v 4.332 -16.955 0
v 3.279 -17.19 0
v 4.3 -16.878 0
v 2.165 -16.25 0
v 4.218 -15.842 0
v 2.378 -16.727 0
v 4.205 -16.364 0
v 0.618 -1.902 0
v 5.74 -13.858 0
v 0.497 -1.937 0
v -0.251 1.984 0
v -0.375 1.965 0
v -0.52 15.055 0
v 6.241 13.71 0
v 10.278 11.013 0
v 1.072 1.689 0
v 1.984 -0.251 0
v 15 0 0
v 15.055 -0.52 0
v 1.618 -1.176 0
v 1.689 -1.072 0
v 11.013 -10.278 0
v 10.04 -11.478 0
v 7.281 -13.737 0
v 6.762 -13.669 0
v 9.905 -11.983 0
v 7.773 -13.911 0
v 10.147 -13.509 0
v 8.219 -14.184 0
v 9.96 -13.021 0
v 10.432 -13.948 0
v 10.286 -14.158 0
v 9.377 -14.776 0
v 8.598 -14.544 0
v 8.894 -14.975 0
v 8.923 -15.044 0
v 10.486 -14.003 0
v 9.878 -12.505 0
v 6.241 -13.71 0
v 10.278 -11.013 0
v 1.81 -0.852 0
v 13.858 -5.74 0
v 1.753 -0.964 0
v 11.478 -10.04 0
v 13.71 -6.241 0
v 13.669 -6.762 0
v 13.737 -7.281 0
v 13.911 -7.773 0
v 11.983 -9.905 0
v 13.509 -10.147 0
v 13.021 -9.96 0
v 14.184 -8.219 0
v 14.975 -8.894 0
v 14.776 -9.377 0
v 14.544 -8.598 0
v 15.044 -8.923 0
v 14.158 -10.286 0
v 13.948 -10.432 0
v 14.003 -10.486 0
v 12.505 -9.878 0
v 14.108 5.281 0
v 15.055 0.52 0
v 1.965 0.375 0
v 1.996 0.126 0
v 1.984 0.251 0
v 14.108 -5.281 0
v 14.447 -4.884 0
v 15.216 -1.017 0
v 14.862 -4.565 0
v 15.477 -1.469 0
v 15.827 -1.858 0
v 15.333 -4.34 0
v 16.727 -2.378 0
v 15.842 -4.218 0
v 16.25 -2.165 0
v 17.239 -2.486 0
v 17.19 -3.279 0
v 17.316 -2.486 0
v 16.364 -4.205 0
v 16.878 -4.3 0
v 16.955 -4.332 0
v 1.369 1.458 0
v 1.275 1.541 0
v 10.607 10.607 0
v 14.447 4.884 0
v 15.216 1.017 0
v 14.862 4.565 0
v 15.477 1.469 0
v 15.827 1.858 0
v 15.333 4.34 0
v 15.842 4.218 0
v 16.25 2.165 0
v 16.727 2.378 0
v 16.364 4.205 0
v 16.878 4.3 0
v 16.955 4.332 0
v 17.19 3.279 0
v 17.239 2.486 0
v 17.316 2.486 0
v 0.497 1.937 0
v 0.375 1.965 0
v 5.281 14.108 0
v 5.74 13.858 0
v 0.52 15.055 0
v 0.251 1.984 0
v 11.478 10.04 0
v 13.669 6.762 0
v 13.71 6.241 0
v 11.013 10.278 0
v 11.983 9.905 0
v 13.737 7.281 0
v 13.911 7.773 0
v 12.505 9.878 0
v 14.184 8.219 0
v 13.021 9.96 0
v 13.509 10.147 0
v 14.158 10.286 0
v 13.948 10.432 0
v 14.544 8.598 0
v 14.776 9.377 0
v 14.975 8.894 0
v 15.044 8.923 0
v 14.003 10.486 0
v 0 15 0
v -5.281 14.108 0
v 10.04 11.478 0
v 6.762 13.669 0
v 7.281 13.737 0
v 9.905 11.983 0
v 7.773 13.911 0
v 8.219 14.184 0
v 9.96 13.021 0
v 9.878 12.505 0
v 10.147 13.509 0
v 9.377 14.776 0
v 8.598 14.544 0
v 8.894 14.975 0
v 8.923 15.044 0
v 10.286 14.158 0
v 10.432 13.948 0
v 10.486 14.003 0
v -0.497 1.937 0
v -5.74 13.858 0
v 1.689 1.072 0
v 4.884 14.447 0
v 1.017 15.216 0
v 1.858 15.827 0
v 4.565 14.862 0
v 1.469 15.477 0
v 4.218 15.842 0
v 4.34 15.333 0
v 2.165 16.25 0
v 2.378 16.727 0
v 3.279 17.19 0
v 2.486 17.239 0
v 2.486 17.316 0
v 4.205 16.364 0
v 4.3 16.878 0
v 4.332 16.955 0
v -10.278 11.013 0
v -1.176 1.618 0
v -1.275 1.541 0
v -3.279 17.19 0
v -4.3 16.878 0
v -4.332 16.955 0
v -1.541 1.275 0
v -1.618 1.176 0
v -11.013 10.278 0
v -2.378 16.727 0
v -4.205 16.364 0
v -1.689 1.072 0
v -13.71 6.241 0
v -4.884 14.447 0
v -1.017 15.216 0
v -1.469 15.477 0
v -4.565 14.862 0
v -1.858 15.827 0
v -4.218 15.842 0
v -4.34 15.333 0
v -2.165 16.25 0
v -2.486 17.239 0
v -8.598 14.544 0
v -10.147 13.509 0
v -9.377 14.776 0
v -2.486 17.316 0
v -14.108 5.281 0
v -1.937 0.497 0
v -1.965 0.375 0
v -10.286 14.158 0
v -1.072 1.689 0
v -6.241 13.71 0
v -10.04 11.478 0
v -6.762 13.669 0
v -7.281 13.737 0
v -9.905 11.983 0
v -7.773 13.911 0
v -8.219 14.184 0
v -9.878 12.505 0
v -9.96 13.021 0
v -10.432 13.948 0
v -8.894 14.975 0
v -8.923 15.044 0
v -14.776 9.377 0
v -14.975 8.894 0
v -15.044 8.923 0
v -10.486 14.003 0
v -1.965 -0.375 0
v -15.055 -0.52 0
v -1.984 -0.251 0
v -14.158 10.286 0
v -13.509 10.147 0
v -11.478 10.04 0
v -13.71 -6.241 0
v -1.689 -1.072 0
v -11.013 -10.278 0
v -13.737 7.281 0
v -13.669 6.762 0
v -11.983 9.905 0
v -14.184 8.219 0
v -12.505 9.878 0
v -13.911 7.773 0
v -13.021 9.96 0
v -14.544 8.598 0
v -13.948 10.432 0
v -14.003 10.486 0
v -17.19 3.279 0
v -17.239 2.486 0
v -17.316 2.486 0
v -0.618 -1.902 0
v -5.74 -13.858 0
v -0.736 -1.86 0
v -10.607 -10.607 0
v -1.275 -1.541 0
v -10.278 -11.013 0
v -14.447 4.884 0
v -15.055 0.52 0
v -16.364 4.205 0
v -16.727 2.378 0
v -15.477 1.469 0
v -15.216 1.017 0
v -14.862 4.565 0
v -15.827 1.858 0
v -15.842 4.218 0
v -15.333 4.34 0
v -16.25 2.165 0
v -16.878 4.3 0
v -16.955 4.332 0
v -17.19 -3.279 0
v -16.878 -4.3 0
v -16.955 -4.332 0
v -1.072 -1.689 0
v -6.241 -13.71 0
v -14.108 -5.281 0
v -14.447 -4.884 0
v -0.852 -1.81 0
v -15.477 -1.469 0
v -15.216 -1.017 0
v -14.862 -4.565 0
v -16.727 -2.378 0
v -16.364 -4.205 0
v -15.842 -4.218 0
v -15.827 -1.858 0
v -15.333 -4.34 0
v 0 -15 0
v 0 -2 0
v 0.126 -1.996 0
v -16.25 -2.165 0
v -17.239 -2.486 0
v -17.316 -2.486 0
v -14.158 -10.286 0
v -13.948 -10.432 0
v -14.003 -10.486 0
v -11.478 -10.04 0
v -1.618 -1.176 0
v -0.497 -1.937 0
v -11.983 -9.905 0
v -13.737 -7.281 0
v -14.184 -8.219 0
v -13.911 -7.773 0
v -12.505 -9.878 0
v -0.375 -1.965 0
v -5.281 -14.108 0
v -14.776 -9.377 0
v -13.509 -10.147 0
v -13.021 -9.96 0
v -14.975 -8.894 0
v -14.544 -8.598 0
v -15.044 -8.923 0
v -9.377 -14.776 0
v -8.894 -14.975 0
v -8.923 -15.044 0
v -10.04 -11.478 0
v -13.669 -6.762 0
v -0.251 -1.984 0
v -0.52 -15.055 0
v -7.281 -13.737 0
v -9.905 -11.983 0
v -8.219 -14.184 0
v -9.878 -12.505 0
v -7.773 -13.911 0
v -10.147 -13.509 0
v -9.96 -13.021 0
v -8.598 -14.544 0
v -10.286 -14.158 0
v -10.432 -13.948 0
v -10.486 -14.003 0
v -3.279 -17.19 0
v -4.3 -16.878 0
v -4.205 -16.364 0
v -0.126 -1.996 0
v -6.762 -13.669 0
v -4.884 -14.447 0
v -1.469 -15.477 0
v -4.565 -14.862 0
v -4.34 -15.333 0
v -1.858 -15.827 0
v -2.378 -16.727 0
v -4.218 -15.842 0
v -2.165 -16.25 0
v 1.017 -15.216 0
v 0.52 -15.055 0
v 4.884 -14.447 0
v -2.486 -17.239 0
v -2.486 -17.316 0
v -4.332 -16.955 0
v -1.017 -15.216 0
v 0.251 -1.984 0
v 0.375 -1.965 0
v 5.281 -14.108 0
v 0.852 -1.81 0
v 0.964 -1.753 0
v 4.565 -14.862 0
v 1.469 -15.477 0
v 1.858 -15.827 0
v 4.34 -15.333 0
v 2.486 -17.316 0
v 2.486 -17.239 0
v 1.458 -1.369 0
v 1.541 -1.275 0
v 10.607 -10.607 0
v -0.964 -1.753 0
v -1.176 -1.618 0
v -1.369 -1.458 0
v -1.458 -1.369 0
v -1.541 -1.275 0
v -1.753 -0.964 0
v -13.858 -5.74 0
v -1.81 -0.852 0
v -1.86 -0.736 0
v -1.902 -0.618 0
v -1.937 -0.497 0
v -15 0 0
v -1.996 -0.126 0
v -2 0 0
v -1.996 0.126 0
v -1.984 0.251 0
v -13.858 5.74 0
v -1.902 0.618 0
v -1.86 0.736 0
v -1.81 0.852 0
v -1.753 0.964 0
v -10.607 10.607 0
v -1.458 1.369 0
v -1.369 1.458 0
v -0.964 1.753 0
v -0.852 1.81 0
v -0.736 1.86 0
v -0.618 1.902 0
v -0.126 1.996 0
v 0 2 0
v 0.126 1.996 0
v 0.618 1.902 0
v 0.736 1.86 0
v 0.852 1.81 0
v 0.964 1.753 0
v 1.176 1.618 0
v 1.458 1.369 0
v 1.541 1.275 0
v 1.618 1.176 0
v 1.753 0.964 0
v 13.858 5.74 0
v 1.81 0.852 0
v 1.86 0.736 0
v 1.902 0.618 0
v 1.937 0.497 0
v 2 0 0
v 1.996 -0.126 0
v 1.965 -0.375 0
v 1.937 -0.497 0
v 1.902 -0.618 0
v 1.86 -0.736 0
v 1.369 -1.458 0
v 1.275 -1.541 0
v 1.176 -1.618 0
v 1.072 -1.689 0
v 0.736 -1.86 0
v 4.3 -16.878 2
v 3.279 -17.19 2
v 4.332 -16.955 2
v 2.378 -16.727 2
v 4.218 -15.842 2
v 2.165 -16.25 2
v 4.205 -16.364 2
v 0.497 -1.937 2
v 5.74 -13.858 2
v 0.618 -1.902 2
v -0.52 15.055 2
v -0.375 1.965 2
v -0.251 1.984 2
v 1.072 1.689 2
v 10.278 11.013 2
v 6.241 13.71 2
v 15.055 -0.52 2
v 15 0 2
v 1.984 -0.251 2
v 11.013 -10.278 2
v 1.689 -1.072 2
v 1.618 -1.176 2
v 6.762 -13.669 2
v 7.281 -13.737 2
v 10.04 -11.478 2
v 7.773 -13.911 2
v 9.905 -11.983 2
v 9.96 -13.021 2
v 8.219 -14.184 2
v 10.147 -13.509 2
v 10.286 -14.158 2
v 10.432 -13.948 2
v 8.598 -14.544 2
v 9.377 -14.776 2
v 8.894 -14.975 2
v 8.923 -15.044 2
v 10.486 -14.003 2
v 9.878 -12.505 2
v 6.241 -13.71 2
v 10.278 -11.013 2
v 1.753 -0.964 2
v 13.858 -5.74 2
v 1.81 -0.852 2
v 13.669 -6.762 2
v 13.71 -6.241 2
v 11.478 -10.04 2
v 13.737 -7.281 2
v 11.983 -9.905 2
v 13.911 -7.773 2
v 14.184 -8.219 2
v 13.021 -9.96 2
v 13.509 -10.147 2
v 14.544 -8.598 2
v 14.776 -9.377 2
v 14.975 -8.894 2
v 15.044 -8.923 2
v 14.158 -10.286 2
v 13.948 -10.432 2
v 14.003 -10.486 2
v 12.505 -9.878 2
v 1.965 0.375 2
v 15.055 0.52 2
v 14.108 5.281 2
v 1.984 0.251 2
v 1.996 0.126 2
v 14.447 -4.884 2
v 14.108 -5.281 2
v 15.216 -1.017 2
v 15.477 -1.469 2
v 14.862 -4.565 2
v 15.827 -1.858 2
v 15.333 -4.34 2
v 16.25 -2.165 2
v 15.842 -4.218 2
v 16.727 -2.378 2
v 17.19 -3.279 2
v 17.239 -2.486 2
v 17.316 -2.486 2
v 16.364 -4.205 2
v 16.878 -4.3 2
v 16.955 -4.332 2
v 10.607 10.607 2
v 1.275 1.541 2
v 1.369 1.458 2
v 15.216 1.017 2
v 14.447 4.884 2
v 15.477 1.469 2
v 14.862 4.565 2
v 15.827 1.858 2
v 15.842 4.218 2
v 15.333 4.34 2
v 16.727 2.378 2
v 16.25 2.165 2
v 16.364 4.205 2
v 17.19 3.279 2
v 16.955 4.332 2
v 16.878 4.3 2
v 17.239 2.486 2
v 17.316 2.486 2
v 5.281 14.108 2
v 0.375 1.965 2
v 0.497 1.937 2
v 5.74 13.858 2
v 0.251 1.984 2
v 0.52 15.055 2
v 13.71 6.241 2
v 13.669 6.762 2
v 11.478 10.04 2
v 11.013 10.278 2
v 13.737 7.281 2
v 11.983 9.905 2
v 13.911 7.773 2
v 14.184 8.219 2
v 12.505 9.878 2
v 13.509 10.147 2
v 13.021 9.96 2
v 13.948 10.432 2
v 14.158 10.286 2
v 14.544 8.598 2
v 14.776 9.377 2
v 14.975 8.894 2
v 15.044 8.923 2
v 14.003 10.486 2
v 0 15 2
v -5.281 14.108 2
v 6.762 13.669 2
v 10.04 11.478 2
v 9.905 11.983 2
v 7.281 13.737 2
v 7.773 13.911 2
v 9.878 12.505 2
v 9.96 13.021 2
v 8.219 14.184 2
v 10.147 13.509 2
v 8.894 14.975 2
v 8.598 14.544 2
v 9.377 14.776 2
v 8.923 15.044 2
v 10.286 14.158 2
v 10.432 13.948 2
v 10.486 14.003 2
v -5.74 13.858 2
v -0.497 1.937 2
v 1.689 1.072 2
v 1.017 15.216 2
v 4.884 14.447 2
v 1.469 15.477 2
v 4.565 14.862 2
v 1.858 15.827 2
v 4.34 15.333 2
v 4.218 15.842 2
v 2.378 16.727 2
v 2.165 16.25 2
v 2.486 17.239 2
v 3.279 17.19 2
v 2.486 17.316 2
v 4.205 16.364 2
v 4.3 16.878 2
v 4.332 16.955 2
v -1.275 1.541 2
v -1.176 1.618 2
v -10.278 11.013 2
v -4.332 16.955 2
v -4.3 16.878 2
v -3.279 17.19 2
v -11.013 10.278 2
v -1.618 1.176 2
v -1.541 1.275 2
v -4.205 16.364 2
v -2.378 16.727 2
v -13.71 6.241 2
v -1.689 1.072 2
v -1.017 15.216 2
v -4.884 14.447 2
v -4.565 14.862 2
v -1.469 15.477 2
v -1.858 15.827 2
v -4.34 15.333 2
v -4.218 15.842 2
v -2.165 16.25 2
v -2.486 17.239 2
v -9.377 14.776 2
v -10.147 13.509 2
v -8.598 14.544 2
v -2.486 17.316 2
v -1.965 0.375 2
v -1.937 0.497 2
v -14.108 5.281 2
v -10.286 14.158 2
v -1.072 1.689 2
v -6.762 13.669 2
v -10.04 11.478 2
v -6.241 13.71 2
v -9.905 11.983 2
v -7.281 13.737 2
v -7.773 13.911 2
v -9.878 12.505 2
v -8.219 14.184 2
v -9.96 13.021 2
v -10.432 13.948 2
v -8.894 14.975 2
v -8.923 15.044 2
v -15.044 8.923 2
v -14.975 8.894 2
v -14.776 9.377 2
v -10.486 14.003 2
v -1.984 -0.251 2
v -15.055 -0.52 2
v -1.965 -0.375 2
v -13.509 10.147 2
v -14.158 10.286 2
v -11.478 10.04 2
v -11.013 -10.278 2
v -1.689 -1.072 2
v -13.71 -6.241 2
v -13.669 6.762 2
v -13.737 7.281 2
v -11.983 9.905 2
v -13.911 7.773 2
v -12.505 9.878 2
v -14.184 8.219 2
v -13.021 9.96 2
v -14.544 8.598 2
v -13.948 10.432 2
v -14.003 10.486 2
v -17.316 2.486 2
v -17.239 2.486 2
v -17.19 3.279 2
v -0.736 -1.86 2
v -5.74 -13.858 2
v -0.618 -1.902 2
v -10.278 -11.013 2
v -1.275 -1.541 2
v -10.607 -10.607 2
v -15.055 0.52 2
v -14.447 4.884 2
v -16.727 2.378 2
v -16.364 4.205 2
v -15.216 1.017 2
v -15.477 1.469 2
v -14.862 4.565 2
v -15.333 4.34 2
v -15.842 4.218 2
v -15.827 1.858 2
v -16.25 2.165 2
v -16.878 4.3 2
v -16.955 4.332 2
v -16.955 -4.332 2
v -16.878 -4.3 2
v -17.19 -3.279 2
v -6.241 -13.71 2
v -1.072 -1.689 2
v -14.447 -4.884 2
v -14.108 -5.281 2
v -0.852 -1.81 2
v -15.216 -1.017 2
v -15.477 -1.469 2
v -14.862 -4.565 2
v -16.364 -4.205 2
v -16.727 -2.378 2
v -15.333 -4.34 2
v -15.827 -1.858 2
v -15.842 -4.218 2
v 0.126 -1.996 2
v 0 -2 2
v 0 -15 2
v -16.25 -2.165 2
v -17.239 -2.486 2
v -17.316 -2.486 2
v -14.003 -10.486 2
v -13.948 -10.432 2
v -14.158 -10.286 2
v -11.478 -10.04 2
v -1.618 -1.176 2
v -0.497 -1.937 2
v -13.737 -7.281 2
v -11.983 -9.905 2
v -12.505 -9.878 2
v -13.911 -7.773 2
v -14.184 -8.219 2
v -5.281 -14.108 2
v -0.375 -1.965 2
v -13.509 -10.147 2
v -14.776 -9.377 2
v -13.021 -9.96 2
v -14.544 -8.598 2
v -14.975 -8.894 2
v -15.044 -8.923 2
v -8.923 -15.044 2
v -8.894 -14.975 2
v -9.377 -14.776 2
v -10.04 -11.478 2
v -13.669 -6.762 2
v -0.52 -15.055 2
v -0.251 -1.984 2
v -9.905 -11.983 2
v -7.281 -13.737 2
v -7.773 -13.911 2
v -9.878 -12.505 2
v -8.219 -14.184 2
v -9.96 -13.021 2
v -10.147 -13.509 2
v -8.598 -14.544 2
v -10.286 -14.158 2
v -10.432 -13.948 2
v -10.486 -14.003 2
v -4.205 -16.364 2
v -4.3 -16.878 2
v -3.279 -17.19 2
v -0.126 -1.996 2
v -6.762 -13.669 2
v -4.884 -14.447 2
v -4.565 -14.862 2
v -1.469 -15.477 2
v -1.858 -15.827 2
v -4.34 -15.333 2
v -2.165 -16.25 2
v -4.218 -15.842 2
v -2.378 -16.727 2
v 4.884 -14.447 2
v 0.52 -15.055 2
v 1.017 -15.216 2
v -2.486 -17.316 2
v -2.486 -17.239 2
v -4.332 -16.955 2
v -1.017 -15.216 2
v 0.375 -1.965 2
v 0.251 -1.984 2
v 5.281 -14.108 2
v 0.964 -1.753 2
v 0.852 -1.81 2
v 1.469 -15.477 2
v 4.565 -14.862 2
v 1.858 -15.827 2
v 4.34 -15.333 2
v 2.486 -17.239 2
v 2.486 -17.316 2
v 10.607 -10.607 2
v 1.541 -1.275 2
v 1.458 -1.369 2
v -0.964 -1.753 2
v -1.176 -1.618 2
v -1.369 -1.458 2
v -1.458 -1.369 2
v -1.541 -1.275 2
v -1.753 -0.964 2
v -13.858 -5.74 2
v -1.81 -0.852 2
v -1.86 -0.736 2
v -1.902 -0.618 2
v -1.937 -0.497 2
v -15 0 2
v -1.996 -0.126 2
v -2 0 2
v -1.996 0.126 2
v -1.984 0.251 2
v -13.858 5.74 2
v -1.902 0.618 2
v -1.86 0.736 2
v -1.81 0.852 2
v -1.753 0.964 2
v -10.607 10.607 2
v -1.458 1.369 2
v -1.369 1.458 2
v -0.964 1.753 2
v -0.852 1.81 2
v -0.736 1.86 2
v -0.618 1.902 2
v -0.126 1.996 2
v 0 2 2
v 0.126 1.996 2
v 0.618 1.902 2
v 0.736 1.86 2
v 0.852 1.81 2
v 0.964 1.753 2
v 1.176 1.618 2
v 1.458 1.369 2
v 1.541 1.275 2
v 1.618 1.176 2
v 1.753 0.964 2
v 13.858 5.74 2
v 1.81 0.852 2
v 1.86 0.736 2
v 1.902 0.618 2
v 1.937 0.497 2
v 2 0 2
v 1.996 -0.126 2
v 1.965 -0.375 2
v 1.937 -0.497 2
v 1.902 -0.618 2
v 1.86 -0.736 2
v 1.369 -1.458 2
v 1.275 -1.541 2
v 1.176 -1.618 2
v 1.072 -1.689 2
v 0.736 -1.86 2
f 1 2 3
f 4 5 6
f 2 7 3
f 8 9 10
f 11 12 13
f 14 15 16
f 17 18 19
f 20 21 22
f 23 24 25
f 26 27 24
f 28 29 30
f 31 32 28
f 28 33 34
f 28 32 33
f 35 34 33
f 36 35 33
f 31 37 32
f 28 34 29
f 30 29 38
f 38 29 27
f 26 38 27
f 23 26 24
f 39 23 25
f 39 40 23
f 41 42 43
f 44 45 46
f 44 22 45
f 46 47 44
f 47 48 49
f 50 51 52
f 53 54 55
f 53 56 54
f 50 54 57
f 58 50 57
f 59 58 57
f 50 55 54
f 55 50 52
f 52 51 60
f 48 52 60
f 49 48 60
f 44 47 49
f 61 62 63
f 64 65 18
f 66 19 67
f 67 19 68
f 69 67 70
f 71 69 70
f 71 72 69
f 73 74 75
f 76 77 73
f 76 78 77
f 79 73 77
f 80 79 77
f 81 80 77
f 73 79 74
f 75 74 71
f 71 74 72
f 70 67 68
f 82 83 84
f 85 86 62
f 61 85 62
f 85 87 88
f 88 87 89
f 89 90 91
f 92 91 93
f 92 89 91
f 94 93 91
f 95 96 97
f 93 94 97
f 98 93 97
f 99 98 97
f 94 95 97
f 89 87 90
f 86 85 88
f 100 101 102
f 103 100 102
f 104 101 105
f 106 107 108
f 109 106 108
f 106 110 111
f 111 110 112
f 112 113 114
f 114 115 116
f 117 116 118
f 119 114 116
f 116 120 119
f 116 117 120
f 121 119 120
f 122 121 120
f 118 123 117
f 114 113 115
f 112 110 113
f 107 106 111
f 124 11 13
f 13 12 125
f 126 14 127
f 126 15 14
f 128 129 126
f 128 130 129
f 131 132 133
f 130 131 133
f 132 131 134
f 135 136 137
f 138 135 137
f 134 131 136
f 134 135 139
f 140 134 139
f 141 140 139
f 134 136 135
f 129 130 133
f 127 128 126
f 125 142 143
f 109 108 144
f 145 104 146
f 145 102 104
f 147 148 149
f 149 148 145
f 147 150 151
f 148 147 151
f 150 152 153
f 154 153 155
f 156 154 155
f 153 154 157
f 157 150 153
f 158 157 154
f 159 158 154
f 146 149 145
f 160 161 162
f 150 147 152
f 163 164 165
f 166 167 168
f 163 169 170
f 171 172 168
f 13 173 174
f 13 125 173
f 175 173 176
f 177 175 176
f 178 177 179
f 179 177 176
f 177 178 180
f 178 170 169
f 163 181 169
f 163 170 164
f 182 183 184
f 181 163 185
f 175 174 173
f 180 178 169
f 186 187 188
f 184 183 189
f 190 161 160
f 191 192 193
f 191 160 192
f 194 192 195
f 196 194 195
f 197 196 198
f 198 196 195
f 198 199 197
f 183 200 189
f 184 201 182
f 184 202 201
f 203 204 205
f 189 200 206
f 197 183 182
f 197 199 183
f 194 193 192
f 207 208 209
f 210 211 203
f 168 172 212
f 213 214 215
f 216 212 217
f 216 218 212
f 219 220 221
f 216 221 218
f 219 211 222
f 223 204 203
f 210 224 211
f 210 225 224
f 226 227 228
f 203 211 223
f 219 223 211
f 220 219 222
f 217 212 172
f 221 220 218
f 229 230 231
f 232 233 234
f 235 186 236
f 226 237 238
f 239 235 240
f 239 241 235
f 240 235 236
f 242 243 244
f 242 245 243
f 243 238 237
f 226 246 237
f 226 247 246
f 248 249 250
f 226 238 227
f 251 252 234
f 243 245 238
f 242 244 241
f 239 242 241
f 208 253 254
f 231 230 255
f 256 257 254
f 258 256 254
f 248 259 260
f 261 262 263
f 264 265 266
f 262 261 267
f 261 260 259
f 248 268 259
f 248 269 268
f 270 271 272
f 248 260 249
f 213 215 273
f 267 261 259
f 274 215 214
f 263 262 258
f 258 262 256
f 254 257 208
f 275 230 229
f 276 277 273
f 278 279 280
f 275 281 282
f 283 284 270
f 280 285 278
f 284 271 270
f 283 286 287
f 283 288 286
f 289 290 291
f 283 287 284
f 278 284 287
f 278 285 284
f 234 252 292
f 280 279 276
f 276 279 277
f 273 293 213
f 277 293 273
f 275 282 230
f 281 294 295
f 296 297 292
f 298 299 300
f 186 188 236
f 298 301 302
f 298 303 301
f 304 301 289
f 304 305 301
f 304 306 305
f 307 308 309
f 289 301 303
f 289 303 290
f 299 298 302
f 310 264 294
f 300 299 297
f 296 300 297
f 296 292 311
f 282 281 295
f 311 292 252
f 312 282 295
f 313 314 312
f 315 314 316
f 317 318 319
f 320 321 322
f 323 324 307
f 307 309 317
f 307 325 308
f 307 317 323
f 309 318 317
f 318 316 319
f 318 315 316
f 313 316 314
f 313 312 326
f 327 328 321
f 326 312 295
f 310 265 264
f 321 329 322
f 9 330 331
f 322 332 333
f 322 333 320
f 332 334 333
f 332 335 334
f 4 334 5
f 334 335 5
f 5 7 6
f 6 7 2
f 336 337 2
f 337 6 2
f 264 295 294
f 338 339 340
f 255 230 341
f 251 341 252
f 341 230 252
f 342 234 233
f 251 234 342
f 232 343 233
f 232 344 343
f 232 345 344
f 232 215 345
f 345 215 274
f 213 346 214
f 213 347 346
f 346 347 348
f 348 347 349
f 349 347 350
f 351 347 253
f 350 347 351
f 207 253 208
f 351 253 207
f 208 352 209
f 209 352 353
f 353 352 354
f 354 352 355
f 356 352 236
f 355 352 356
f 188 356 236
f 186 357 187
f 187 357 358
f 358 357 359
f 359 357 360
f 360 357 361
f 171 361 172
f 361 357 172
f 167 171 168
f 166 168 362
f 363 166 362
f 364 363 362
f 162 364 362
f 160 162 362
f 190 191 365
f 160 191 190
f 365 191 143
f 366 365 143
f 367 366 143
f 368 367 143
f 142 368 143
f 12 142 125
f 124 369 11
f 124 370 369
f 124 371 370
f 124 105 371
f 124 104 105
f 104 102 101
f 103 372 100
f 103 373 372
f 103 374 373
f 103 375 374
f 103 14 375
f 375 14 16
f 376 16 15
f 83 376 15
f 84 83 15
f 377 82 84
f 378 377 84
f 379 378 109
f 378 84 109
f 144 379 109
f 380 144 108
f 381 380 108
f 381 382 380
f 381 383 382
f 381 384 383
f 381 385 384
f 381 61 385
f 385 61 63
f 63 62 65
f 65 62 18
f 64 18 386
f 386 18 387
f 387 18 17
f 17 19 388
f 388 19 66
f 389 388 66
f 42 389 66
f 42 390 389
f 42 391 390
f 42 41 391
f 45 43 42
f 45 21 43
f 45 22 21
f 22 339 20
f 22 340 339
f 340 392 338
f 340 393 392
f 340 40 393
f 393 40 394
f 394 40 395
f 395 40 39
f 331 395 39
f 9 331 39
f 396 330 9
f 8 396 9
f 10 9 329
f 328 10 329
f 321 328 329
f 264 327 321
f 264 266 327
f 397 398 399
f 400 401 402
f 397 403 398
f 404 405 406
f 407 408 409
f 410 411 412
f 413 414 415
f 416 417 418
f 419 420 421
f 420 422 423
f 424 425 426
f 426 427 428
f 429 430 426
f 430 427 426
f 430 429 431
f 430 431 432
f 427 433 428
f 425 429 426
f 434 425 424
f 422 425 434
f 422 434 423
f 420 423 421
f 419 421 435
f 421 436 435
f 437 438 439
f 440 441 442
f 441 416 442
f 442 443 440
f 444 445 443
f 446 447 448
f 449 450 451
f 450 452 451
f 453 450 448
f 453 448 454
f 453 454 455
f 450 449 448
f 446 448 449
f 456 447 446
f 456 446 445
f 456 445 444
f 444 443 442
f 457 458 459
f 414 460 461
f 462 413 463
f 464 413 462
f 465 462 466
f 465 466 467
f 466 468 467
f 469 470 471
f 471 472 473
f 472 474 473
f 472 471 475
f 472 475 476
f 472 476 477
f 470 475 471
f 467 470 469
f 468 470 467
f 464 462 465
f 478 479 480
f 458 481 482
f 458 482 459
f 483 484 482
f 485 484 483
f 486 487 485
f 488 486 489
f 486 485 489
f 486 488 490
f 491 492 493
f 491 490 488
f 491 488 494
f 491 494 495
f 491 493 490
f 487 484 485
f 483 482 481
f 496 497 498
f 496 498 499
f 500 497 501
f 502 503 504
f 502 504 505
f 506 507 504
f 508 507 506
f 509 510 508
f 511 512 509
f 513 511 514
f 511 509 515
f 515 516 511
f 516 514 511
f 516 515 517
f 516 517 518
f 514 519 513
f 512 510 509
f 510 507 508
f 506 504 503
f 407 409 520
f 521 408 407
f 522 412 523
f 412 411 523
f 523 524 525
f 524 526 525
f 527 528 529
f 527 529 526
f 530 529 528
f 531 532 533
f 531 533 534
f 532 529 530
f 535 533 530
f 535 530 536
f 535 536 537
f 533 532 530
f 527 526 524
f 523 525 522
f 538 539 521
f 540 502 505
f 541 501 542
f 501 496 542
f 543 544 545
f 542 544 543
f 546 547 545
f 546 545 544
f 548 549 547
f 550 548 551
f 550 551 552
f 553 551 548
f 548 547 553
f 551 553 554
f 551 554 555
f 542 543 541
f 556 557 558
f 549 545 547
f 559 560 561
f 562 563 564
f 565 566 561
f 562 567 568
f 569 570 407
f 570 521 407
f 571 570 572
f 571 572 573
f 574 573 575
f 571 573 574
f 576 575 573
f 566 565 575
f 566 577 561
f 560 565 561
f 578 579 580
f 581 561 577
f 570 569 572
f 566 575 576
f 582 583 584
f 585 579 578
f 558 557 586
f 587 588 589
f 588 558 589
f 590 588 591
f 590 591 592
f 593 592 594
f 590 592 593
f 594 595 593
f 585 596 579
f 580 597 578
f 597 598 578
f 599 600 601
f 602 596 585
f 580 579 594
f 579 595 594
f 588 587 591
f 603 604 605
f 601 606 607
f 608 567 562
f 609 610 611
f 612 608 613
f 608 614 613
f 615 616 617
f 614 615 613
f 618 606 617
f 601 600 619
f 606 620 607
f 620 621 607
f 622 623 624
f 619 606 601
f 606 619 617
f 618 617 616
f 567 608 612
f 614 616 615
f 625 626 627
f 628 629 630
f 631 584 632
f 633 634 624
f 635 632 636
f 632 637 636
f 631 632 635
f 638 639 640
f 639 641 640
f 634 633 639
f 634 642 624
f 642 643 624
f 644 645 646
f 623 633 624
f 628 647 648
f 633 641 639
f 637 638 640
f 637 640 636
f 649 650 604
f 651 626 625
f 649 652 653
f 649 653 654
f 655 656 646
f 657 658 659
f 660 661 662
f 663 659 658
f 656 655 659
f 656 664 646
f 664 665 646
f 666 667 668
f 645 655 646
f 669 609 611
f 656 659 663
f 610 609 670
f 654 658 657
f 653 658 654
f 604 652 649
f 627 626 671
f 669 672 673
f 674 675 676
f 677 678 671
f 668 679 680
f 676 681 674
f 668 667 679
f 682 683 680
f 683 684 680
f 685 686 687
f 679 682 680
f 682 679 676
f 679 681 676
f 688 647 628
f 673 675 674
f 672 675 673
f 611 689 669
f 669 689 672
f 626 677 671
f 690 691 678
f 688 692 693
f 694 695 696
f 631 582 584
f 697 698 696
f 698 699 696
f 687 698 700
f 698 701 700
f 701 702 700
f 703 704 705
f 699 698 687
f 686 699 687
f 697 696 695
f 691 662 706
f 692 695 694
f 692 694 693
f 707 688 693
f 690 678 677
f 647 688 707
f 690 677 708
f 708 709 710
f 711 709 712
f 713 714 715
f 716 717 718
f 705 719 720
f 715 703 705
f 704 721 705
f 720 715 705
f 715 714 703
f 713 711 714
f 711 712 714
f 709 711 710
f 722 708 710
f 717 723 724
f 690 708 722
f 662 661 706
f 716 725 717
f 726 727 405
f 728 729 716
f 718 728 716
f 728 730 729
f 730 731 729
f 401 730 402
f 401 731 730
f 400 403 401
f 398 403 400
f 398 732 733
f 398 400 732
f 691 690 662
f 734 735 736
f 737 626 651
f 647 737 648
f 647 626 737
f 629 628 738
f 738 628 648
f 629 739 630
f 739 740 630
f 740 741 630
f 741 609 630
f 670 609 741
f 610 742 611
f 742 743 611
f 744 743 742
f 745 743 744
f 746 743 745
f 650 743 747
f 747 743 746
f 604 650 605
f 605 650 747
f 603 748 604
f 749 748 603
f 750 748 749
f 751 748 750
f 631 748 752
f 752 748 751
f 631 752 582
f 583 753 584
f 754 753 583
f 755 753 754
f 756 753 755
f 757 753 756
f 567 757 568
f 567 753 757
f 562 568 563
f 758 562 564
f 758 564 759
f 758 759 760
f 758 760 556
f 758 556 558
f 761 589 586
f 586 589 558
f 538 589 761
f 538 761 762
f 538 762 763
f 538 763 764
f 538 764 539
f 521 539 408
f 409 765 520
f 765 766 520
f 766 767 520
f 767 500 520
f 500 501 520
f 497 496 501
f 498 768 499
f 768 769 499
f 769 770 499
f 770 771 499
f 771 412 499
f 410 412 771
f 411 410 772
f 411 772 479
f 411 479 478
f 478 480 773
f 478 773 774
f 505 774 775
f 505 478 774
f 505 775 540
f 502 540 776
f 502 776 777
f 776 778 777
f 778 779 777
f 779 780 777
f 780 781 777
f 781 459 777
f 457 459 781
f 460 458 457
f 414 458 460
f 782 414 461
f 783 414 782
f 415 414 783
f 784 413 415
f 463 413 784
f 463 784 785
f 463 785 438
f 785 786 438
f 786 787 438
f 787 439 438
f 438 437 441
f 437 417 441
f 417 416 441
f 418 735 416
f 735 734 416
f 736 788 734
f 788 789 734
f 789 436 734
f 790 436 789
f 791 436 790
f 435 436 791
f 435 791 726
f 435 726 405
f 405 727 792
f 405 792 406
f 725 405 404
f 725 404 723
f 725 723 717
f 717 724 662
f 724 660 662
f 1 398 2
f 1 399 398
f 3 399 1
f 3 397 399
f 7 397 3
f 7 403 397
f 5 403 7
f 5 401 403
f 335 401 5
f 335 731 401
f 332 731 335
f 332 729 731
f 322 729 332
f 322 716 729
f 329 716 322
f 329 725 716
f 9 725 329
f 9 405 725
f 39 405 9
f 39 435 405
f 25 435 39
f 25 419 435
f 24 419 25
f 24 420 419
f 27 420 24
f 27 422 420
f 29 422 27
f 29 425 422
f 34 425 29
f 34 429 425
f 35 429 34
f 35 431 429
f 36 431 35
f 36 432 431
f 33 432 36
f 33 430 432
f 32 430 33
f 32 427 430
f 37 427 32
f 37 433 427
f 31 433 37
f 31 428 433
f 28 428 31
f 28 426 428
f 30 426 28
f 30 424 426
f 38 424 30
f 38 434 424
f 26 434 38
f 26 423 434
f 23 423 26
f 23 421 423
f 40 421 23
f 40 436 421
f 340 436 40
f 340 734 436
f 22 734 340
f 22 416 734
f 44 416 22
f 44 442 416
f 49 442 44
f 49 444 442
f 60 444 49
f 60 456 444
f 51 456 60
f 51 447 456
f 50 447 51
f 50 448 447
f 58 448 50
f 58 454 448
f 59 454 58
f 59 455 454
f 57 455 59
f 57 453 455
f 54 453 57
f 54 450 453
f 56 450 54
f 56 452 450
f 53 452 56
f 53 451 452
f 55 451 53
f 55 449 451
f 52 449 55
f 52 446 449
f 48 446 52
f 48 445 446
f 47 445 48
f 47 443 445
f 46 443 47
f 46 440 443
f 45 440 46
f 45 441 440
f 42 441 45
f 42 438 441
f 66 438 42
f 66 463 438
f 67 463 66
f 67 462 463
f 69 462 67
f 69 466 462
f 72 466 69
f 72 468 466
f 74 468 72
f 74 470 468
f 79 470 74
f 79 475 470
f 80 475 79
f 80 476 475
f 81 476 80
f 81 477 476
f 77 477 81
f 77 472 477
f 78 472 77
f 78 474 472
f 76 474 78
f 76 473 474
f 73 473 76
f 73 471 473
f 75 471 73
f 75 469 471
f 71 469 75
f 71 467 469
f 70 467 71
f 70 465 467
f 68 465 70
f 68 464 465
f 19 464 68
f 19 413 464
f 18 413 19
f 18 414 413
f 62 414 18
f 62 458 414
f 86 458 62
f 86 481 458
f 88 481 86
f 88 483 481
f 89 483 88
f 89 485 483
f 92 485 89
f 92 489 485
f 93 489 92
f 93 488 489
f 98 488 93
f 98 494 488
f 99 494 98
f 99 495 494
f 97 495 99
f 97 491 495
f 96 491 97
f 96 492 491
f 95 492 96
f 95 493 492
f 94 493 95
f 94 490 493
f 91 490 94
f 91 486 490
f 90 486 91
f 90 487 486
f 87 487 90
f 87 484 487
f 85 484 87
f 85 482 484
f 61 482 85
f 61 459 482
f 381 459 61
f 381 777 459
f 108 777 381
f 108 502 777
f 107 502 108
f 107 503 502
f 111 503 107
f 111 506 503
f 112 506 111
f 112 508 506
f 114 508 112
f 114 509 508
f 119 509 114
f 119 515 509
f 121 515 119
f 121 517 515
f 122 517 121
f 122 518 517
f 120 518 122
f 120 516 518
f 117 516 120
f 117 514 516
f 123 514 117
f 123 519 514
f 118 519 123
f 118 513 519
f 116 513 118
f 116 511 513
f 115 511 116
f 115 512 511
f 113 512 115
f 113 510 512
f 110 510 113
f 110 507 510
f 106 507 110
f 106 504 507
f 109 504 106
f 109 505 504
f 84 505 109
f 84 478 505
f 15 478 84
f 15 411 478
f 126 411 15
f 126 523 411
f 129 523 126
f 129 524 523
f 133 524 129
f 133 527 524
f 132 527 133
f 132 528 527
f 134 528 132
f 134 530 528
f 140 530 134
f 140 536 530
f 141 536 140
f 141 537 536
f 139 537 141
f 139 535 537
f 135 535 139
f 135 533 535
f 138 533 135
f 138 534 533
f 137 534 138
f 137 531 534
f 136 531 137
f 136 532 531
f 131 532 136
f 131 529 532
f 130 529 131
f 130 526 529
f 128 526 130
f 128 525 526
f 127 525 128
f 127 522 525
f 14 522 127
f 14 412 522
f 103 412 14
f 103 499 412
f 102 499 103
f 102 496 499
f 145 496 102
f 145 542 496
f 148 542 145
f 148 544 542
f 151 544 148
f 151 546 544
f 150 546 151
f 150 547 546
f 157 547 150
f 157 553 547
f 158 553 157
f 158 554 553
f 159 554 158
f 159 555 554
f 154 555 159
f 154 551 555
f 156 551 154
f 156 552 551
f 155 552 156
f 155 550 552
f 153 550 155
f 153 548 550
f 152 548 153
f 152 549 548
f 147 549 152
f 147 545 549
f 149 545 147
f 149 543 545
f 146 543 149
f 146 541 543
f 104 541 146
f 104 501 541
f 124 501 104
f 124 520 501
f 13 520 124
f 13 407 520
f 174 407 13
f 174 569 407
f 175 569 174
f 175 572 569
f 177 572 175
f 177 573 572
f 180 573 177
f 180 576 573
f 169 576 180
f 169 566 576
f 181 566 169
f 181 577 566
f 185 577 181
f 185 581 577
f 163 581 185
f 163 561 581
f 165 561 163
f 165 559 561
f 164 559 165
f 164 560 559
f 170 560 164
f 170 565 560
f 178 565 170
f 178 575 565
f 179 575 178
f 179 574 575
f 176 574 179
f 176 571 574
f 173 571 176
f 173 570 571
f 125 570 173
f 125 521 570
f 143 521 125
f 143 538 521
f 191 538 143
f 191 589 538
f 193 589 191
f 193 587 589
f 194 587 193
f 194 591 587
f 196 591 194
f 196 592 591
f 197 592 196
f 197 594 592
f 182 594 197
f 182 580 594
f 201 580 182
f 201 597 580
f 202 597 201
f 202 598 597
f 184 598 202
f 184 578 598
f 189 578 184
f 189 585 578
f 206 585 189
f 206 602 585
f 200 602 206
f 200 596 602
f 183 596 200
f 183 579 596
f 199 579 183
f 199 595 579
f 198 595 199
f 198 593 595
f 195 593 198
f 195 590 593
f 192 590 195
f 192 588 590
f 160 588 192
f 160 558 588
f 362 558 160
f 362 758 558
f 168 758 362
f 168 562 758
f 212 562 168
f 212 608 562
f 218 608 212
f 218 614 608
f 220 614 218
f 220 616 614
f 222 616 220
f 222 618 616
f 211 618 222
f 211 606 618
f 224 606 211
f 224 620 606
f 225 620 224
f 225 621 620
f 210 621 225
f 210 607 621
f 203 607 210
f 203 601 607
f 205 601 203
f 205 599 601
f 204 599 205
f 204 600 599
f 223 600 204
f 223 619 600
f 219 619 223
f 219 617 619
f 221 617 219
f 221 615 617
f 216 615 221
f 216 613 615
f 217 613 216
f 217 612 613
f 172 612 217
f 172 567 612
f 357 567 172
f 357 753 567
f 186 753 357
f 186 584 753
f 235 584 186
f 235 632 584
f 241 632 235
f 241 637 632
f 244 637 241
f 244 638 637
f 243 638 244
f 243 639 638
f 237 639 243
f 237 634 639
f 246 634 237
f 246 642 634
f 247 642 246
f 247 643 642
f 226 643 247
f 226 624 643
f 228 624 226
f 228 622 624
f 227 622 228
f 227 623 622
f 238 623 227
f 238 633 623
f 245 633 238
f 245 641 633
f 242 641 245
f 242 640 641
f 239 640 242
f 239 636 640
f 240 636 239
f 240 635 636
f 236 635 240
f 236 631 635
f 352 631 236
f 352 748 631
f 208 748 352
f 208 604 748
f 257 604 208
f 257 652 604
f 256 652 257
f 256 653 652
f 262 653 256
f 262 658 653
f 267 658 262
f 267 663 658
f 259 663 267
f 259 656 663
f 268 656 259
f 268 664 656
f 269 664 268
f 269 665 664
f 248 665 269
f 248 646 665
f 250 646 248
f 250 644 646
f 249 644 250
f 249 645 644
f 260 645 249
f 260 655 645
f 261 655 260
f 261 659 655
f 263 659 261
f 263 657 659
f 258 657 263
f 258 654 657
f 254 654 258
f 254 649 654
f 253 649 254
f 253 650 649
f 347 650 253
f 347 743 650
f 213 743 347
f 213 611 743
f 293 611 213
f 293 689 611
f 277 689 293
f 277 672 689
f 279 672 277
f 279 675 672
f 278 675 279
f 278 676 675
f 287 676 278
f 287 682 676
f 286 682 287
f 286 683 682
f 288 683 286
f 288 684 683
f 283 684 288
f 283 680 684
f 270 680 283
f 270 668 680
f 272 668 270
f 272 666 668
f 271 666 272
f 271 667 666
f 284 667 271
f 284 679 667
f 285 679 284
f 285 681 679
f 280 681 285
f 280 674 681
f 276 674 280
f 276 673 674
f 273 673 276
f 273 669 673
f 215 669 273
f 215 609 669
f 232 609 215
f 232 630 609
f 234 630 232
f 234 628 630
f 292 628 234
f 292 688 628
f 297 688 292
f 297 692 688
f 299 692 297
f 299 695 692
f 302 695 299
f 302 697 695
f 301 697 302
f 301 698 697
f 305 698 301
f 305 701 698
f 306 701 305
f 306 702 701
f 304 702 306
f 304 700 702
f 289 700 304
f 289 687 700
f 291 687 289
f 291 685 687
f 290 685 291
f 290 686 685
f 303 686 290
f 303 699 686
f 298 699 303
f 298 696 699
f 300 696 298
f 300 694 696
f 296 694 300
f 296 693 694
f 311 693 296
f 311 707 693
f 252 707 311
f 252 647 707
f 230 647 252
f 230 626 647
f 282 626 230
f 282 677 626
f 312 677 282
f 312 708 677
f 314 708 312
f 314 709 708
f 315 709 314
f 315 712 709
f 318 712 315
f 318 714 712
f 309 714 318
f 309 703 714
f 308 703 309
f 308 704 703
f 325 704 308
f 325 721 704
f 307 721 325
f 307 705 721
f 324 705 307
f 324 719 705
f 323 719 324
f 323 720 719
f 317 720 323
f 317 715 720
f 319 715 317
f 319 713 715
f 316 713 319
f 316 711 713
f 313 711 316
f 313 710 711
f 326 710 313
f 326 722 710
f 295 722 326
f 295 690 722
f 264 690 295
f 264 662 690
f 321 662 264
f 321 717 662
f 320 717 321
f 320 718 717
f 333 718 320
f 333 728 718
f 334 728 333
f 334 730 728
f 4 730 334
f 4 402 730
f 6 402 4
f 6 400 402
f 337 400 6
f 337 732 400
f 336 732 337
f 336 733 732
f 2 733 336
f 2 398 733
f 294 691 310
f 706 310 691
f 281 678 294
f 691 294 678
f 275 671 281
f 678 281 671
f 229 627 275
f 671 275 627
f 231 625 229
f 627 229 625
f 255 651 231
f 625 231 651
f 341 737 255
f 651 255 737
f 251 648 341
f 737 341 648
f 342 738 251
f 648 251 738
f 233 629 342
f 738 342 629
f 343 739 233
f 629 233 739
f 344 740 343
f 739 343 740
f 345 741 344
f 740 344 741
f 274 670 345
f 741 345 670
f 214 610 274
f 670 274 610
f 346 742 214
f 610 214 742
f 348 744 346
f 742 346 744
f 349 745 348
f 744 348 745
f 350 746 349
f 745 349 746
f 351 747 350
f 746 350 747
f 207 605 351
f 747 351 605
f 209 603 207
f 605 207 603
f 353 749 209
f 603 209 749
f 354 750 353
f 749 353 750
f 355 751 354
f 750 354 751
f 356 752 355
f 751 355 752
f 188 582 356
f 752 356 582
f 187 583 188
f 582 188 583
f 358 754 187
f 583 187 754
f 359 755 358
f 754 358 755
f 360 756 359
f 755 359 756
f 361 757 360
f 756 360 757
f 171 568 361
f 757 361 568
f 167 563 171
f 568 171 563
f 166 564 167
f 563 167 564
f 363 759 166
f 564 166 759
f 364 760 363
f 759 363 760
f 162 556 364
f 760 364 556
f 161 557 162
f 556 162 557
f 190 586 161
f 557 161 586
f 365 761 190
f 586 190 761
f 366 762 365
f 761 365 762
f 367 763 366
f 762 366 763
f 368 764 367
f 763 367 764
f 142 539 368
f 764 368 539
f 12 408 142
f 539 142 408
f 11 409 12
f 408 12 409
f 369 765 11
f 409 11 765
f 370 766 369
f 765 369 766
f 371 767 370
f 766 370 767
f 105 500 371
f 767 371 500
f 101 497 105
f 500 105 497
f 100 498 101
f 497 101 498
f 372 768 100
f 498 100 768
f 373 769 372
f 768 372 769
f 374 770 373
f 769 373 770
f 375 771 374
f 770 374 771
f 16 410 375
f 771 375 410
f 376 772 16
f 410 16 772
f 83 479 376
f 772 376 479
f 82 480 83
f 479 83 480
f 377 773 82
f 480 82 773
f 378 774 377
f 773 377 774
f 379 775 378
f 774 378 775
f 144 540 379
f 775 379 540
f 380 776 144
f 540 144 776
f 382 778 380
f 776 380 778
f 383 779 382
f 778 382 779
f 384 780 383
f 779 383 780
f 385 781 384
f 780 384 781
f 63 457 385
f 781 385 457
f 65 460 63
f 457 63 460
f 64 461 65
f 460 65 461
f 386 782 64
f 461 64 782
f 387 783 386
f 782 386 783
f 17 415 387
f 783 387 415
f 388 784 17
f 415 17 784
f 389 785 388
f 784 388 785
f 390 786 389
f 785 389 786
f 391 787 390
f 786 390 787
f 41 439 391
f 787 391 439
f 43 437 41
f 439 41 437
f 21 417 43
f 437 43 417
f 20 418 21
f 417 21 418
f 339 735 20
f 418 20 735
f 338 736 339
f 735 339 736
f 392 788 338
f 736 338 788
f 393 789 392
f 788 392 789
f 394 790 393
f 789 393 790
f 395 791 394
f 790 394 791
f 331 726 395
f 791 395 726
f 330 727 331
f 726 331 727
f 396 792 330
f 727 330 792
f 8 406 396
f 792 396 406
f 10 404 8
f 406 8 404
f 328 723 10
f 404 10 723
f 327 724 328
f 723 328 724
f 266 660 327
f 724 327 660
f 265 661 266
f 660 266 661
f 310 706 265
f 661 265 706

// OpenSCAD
outer_diameter = 35;
inner_diameter = 4;
ring_height = 2;
num_holes = 16;
hole_diameter = 5;
hole_radius = outer_diameter / 2 ;


module ring2D() {
    difference() {
        // Outer ring shape
        difference() {
            circle(outer_diameter / 2, $fn=100);
            circle(inner_diameter / 2, $fn=100);
        }
        // Add circular cutouts
        for (i = [0 : 360 / num_holes : 360 - (360 / num_holes)]) {
            rotate(i)
                translate([hole_radius, 0])
                    circle(hole_diameter / 2, $fn=30);
        }
    }
}

// Now extrude the entire 2D shape once
linear_extrude(height = ring_height)
    ring2D();
